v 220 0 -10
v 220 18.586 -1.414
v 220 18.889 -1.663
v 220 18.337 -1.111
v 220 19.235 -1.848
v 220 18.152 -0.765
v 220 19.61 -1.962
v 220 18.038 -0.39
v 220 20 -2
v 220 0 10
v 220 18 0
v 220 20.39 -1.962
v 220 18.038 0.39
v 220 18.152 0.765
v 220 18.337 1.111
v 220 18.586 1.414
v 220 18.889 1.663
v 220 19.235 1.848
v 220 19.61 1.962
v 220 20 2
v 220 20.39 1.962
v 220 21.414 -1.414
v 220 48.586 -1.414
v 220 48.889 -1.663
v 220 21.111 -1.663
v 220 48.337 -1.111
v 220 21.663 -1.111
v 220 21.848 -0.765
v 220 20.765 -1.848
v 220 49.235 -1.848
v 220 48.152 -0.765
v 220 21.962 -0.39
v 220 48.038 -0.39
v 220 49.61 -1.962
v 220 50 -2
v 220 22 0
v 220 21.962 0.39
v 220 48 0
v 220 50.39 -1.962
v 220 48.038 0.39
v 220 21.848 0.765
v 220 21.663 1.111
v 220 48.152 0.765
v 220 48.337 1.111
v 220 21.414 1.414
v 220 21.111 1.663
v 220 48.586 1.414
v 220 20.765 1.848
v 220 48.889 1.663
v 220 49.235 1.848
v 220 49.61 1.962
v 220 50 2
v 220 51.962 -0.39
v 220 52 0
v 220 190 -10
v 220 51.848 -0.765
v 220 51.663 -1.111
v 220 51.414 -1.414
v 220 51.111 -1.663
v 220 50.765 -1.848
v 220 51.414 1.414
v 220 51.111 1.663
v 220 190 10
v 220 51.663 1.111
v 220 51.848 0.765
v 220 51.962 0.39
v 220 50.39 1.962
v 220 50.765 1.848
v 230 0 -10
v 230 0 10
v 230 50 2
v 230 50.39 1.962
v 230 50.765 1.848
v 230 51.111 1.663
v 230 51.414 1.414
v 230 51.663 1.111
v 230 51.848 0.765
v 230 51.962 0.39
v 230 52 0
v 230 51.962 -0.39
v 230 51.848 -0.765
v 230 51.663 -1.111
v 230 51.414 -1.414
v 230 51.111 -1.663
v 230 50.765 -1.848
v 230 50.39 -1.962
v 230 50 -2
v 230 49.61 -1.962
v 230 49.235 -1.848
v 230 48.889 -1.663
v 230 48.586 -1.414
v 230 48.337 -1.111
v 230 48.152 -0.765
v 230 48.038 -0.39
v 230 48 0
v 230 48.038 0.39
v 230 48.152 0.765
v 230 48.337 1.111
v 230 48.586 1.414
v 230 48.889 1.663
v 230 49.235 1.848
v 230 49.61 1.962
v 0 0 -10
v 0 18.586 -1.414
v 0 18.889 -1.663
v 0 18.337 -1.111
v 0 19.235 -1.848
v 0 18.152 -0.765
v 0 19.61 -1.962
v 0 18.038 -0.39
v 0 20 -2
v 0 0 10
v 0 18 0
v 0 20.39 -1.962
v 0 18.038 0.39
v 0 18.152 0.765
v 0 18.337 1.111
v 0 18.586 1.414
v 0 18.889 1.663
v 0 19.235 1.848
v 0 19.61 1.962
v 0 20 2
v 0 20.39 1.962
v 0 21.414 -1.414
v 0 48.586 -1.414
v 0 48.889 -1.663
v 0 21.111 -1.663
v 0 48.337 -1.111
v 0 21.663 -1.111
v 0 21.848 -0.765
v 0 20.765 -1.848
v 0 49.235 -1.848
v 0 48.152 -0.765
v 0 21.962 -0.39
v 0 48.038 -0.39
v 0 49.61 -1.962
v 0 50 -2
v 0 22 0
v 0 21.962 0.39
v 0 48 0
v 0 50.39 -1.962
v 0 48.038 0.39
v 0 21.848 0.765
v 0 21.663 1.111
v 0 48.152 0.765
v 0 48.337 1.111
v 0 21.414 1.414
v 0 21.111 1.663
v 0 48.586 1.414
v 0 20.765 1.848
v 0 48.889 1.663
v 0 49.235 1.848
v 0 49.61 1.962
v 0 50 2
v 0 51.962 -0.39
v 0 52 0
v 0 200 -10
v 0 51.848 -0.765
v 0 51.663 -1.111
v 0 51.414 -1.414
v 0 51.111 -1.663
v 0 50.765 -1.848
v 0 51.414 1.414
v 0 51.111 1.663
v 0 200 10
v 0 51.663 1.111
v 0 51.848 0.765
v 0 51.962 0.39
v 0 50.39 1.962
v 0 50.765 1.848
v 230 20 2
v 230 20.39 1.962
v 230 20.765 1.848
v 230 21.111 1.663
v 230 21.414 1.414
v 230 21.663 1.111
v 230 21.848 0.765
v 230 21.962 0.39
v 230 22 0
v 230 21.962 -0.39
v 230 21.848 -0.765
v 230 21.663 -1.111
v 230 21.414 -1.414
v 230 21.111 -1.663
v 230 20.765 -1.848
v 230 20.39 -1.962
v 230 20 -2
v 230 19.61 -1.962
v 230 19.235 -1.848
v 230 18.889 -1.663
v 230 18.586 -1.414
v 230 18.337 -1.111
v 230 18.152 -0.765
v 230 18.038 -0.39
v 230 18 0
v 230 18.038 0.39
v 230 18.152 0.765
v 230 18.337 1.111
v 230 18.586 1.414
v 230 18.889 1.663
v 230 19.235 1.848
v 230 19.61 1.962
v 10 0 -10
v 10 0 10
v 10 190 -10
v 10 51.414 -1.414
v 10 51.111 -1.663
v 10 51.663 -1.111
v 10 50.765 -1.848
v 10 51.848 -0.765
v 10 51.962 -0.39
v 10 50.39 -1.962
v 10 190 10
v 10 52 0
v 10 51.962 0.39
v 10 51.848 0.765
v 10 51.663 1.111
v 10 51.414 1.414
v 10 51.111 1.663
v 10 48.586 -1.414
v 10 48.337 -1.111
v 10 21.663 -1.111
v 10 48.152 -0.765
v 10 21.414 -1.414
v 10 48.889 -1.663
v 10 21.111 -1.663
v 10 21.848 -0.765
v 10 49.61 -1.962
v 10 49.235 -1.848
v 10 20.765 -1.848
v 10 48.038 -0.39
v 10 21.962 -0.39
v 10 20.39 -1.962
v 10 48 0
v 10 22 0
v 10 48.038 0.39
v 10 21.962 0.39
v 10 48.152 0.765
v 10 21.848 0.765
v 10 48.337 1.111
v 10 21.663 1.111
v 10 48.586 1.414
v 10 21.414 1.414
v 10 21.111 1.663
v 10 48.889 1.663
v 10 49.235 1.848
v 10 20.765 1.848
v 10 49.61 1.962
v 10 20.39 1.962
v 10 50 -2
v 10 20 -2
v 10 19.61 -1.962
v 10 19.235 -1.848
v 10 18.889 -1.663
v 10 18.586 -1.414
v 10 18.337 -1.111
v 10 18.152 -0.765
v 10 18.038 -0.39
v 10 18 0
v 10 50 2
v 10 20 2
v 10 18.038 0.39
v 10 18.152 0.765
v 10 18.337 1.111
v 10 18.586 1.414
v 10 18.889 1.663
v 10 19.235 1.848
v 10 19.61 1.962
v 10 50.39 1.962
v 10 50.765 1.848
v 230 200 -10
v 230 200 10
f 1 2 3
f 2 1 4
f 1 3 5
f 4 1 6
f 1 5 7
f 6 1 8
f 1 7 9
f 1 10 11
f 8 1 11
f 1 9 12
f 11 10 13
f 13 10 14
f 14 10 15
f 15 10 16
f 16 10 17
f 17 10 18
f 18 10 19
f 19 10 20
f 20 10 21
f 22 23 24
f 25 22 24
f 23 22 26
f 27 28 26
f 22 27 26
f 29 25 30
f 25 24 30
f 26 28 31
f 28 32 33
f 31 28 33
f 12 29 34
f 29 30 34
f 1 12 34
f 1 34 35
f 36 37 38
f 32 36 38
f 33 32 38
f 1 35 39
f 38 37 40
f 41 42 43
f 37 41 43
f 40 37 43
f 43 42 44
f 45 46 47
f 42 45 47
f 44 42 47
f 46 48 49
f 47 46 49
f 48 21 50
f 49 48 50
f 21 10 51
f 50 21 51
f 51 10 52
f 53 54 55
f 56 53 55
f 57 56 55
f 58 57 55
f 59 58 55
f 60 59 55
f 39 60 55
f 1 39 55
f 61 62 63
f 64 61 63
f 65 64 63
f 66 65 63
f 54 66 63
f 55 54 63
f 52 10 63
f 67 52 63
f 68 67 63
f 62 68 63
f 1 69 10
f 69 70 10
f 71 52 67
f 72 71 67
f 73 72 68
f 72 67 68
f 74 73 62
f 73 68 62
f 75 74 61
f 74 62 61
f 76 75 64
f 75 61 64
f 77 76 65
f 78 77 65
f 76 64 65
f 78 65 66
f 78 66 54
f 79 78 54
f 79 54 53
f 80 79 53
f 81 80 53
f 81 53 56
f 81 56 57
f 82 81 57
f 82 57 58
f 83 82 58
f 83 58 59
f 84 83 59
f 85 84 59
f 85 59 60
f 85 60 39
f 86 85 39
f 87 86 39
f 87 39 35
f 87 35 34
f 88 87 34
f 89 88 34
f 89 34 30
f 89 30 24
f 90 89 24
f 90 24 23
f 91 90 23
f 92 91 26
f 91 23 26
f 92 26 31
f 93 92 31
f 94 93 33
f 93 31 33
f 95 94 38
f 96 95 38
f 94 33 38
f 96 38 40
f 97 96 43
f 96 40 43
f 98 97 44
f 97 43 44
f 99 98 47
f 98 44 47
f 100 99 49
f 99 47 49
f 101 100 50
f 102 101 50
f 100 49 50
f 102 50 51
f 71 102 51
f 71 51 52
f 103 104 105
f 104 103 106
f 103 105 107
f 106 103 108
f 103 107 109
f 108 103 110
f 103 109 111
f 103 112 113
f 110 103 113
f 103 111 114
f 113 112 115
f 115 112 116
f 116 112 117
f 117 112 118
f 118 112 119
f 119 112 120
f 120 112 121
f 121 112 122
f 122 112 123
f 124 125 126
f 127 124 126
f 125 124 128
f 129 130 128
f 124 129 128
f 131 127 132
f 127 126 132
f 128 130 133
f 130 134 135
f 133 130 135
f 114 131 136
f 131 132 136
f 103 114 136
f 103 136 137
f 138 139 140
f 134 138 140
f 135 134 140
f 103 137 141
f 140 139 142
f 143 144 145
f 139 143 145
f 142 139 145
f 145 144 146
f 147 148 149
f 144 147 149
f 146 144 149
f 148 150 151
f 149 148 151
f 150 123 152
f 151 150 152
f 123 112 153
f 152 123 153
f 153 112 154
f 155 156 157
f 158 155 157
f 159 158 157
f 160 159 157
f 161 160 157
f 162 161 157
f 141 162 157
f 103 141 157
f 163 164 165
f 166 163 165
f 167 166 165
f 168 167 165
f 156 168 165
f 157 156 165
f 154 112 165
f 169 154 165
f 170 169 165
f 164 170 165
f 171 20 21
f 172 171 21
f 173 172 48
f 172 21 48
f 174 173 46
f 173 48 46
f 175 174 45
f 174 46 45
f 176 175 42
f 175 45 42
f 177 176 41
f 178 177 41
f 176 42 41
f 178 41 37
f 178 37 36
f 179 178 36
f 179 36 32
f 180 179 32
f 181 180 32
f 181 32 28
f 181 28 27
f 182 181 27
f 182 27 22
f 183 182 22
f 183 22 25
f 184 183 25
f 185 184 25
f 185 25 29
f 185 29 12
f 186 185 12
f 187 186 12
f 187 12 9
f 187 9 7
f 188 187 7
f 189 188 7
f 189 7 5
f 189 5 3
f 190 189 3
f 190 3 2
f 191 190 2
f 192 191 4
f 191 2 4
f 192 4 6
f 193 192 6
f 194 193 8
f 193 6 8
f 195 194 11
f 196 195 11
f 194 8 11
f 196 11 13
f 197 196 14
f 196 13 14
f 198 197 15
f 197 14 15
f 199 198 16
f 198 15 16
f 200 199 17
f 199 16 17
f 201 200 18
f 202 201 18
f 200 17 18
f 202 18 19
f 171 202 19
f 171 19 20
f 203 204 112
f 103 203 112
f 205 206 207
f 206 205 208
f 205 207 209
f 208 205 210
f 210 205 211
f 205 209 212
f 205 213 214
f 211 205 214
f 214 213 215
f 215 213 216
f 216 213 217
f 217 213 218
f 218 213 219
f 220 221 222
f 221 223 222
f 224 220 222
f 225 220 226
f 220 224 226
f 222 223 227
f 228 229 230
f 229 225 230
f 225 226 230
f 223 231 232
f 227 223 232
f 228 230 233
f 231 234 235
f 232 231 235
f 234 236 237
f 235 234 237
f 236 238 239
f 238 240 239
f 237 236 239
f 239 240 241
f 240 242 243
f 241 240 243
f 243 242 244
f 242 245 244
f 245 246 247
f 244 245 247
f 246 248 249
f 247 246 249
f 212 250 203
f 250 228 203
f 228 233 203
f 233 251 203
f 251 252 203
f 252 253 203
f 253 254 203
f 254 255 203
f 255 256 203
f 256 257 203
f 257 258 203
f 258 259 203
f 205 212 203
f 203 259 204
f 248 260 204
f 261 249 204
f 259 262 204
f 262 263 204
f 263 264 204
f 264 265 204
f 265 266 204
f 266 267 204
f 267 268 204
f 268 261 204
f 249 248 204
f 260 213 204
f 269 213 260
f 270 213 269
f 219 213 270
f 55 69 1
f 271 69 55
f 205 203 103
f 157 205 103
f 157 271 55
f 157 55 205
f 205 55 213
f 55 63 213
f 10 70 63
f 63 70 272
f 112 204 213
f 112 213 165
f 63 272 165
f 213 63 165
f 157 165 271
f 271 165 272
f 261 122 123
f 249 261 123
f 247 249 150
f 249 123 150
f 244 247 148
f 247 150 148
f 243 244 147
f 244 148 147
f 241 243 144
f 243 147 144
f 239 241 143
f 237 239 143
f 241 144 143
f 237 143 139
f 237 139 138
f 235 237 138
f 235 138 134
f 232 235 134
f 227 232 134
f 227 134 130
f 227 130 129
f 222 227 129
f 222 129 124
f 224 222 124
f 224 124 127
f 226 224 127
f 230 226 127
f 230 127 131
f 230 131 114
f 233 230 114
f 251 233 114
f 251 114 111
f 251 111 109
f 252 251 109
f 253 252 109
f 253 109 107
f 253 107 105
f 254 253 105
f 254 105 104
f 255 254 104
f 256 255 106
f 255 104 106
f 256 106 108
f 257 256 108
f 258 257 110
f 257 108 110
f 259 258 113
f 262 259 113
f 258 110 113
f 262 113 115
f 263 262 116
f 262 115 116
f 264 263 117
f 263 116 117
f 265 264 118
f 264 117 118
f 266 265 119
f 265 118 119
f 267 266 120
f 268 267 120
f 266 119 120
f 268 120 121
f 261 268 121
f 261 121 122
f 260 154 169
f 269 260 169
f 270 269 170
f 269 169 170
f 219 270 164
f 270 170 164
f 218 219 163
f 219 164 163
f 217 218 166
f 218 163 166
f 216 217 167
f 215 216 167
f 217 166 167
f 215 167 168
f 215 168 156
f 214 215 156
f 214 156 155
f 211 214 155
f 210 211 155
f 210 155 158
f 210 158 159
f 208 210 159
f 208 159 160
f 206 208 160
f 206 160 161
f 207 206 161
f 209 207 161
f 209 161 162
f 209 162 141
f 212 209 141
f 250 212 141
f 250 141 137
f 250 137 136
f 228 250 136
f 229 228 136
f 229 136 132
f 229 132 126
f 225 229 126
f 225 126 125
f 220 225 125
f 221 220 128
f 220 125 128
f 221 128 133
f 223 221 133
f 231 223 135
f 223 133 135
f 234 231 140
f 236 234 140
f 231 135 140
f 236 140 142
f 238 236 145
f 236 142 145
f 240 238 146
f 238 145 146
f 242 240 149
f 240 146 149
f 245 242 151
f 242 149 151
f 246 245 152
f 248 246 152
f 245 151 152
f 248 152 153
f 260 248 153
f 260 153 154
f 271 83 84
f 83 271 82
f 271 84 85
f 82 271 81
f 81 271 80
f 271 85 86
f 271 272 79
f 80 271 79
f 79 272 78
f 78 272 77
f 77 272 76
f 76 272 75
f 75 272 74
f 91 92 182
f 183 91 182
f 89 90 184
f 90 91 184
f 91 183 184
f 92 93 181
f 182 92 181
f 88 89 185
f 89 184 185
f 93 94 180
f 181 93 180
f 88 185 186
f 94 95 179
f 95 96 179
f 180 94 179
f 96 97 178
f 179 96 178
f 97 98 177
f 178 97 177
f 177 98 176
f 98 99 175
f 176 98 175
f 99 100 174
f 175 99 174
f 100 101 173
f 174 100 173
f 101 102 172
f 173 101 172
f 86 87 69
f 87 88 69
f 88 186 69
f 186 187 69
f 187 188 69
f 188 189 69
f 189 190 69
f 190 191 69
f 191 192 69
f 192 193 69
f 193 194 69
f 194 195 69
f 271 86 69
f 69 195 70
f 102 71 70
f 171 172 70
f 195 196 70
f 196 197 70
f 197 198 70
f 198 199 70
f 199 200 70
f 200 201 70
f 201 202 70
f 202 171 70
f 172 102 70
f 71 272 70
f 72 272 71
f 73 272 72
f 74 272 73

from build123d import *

# Parameters (mm, degrees)
BOSS_EXTRUDE1_DEPTH = 10
SKETCH2_R           = 2
CUT_EXTRUDE1_DEPTH  = 305.95901364


with BuildPart() as part:
    # Sketch1 → Boss-Extrude1 (new, symmetric)
    with BuildSketch(Plane.XY):
        Polygon((0, 0), (0, 200), (230, 200), (230, 0), (220, 0), (220, 190), (10, 190), (10, 0), align=None)
    extrude(amount=BOSS_EXTRUDE1_DEPTH, both=True)

    # Sketch2 → Cut-Extrude1 (cut, through all)
    with BuildSketch(Plane.ZY):
        with Locations((0, 20)):
            Circle(SKETCH2_R)
        with Locations((0, 50)):
            Circle(SKETCH2_R)
    extrude(amount=-CUT_EXTRUDE1_DEPTH, mode=Mode.SUBTRACT)


solid = part.part
